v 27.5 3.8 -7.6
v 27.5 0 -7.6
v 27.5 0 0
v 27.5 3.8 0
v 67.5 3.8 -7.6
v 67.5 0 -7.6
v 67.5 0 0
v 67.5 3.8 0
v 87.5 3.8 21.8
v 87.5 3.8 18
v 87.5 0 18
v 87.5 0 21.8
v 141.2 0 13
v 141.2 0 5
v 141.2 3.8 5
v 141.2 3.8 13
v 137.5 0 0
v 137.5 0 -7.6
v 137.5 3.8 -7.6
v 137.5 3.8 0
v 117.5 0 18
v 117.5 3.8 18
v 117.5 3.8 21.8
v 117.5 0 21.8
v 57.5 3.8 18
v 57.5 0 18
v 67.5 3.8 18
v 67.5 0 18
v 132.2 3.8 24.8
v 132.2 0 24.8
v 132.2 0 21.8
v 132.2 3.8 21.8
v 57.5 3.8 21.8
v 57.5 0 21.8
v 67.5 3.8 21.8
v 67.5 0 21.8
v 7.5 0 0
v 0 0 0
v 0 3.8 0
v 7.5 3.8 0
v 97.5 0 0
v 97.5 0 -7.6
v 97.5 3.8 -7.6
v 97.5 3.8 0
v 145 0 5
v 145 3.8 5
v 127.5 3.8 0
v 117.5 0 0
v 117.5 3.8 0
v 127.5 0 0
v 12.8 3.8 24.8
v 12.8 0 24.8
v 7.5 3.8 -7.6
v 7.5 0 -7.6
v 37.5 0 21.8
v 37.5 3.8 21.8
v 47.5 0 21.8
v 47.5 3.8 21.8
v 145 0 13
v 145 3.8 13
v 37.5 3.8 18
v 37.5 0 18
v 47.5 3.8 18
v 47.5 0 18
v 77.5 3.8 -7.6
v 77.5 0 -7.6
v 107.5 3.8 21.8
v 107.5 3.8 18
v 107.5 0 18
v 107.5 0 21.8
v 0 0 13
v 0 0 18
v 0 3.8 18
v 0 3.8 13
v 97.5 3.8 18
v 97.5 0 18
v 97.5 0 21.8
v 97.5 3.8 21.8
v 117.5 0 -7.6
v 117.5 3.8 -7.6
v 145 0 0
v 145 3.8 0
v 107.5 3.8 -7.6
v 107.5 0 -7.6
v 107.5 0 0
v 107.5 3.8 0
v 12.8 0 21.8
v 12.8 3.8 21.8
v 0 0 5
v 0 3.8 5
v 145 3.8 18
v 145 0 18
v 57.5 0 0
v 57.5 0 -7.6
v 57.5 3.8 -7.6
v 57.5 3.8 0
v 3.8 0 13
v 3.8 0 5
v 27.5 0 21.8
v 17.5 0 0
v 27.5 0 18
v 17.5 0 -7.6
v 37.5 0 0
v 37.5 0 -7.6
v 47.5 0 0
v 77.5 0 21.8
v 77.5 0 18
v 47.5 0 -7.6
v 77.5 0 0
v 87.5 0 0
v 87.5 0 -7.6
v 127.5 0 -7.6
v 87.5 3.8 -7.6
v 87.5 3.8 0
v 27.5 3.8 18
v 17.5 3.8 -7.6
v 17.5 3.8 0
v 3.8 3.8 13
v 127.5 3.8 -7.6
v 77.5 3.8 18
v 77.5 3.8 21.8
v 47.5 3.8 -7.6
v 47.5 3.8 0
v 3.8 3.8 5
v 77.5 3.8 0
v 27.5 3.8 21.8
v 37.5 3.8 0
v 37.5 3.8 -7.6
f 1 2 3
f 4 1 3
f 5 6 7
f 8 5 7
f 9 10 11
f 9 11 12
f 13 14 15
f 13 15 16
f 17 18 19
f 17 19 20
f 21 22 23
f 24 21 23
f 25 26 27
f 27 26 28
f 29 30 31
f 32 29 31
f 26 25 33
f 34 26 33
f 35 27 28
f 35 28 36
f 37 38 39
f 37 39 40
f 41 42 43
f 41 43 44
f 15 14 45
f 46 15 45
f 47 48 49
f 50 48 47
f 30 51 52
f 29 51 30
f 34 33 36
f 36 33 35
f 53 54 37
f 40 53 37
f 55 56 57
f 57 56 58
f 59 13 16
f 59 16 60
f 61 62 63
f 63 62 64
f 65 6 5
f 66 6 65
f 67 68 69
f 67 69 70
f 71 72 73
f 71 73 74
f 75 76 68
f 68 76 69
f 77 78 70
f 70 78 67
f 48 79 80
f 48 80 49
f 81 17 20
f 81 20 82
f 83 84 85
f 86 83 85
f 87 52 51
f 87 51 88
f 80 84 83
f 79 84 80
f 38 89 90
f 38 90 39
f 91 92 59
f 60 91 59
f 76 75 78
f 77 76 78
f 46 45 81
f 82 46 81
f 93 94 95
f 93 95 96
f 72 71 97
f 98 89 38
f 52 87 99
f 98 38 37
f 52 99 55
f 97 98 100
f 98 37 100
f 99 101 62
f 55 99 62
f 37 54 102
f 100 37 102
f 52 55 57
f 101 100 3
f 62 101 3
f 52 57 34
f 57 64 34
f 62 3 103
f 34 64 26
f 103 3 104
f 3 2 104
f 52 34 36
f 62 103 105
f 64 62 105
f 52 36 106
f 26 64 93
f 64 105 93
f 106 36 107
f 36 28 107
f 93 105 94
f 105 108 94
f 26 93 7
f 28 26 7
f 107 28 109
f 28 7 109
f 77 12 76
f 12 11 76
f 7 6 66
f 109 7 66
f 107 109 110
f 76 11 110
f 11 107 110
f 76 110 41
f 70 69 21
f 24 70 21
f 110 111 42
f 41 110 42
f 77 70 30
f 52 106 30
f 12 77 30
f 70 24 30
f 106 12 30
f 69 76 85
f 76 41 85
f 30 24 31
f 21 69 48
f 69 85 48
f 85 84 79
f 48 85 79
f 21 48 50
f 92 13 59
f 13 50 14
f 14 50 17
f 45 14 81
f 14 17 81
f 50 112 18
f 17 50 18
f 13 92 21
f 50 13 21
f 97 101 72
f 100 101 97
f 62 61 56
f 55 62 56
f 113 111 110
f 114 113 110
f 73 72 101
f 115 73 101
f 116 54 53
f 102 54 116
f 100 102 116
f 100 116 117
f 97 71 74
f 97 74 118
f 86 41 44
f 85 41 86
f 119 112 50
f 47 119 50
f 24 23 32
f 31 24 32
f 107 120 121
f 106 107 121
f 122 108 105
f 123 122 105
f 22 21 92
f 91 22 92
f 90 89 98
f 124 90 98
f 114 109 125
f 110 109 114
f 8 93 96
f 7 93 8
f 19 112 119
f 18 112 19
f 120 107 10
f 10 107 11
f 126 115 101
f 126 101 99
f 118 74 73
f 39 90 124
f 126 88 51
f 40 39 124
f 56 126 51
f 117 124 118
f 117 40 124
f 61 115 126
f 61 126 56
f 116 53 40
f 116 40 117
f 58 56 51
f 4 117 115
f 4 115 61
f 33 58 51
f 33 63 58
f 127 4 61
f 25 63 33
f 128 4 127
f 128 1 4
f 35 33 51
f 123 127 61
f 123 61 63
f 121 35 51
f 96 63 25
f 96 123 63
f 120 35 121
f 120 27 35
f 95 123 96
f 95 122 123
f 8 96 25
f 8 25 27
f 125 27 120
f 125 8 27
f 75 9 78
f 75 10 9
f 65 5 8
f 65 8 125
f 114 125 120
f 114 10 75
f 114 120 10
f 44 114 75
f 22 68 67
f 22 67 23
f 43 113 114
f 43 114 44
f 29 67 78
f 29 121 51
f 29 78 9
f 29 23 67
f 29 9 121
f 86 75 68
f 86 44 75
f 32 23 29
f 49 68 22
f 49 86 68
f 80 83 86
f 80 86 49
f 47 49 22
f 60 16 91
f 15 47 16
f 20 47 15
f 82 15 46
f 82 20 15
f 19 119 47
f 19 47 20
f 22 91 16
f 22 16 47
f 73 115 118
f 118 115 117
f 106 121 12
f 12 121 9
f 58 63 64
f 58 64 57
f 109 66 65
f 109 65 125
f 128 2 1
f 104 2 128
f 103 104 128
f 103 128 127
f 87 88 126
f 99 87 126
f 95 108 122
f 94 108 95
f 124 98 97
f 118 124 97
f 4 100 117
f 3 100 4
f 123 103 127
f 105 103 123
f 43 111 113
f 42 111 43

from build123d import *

# Parameters (mm, degrees)
SKETCH1_W           = 145
SKETCH1_H           = 18
BOSS_EXTRUDE1_DEPTH = 3.8
SKETCH2_W           = 10
SKETCH2_H           = 3.8
SKETCH2_H_2         = 7.6
BOSS_EXTRUDE2_DEPTH = 3.8
LPATTERN1_COUNT     = 4
LPATTERN1_PITCH     = 20
LPATTERN1_COL_COUNT = 4
LPATTERN1_COL_PITCH = 20
SKETCH3_W           = 145
SKETCH3_H           = 3
BOSS_EXTRUDE3_DEPTH = 3.8
SKETCH4_W           = 10
SKETCH4_H           = 3.8
CUT_EXTRUDE1_DEPTH  = 148.154612568
SKETCH5_W           = 12.8
SKETCH5_H           = 3
CUT_EXTRUDE2_DEPTH  = 148.154612568
SKETCH6_W           = 3.8
SKETCH6_H           = 8
CUT_EXTRUDE3_DEPTH  = 148.154612568


with BuildPart() as part:
    # Sketch1 → Boss-Extrude1 (new body)
    with BuildSketch(Plane(origin=(0, 0, 0), x_dir=(1, 0, 0), z_dir=(0, 1, 0))):
        with Locations((72.5, -9)):
            Rectangle(SKETCH1_W, SKETCH1_H)
    extrude(amount=BOSS_EXTRUDE1_DEPTH)

    # Sketch2 → Boss-Extrude2 (add, through all)
    with BuildSketch(Plane.XZ):
        with Locations((72.5, 19.9)):
            Rectangle(SKETCH2_W, SKETCH2_H)
        with Locations((72.5, -3.8)):
            Rectangle(SKETCH2_W, SKETCH2_H_2)
    boss_extrude2 = extrude(amount=-BOSS_EXTRUDE2_DEPTH)

    # LPattern1: Boss-Extrude2 ×4
    with Locations(*[(i * LPATTERN1_PITCH, 0, 0) for i in range(1, LPATTERN1_COUNT)]):
        add(boss_extrude2)

    # LPattern1 col: Boss-Extrude2 ×4
    with Locations(*[(-i * LPATTERN1_COL_PITCH, 0, 0) for i in range(1, LPATTERN1_COL_COUNT)]):
        add(boss_extrude2)

    # Sketch3 → Boss-Extrude3 (add, through all)
    with BuildSketch(Plane(origin=(0, 3.8, 0), x_dir=(1, 0, 0), z_dir=(0, 1, 0))):
        with Locations((72.5, -23.3)):
            Rectangle(SKETCH3_W, SKETCH3_H)
    extrude(amount=-BOSS_EXTRUDE3_DEPTH)

    # Sketch4 → Cut-Extrude1 (cut, through all)
    with BuildSketch(Plane(origin=(0, 3.8, 0), x_dir=(1, 0, 0), z_dir=(0, 1, 0))):
        with Locations((12.5, -19.9)):
            Rectangle(SKETCH4_W, SKETCH4_H)
        with Locations((132.5, -19.9)):
            Rectangle(SKETCH4_W, SKETCH4_H)
    extrude(amount=-CUT_EXTRUDE1_DEPTH, mode=Mode.SUBTRACT)

    # Sketch5 → Cut-Extrude2 (cut, through all)
    with BuildSketch(Plane(origin=(0, 3.8, 0), x_dir=(1, 0, 0), z_dir=(0, 1, 0))):
        with Locations((6.4, -23.3)):
            Rectangle(SKETCH5_W, SKETCH5_H)
        with Locations((138.6, -23.3)):
            Rectangle(SKETCH5_W, SKETCH5_H)
    extrude(amount=-CUT_EXTRUDE2_DEPTH, mode=Mode.SUBTRACT)

    # Sketch6 → Cut-Extrude3 (cut, through all)
    with BuildSketch(Plane.XZ):
        with Locations((1.9, 9)):
            Rectangle(SKETCH6_W, SKETCH6_H)
        with Locations((143.1, 9)):
            Rectangle(SKETCH6_W, SKETCH6_H)
    extrude(amount=-CUT_EXTRUDE3_DEPTH, mode=Mode.SUBTRACT)


solid = part.part
